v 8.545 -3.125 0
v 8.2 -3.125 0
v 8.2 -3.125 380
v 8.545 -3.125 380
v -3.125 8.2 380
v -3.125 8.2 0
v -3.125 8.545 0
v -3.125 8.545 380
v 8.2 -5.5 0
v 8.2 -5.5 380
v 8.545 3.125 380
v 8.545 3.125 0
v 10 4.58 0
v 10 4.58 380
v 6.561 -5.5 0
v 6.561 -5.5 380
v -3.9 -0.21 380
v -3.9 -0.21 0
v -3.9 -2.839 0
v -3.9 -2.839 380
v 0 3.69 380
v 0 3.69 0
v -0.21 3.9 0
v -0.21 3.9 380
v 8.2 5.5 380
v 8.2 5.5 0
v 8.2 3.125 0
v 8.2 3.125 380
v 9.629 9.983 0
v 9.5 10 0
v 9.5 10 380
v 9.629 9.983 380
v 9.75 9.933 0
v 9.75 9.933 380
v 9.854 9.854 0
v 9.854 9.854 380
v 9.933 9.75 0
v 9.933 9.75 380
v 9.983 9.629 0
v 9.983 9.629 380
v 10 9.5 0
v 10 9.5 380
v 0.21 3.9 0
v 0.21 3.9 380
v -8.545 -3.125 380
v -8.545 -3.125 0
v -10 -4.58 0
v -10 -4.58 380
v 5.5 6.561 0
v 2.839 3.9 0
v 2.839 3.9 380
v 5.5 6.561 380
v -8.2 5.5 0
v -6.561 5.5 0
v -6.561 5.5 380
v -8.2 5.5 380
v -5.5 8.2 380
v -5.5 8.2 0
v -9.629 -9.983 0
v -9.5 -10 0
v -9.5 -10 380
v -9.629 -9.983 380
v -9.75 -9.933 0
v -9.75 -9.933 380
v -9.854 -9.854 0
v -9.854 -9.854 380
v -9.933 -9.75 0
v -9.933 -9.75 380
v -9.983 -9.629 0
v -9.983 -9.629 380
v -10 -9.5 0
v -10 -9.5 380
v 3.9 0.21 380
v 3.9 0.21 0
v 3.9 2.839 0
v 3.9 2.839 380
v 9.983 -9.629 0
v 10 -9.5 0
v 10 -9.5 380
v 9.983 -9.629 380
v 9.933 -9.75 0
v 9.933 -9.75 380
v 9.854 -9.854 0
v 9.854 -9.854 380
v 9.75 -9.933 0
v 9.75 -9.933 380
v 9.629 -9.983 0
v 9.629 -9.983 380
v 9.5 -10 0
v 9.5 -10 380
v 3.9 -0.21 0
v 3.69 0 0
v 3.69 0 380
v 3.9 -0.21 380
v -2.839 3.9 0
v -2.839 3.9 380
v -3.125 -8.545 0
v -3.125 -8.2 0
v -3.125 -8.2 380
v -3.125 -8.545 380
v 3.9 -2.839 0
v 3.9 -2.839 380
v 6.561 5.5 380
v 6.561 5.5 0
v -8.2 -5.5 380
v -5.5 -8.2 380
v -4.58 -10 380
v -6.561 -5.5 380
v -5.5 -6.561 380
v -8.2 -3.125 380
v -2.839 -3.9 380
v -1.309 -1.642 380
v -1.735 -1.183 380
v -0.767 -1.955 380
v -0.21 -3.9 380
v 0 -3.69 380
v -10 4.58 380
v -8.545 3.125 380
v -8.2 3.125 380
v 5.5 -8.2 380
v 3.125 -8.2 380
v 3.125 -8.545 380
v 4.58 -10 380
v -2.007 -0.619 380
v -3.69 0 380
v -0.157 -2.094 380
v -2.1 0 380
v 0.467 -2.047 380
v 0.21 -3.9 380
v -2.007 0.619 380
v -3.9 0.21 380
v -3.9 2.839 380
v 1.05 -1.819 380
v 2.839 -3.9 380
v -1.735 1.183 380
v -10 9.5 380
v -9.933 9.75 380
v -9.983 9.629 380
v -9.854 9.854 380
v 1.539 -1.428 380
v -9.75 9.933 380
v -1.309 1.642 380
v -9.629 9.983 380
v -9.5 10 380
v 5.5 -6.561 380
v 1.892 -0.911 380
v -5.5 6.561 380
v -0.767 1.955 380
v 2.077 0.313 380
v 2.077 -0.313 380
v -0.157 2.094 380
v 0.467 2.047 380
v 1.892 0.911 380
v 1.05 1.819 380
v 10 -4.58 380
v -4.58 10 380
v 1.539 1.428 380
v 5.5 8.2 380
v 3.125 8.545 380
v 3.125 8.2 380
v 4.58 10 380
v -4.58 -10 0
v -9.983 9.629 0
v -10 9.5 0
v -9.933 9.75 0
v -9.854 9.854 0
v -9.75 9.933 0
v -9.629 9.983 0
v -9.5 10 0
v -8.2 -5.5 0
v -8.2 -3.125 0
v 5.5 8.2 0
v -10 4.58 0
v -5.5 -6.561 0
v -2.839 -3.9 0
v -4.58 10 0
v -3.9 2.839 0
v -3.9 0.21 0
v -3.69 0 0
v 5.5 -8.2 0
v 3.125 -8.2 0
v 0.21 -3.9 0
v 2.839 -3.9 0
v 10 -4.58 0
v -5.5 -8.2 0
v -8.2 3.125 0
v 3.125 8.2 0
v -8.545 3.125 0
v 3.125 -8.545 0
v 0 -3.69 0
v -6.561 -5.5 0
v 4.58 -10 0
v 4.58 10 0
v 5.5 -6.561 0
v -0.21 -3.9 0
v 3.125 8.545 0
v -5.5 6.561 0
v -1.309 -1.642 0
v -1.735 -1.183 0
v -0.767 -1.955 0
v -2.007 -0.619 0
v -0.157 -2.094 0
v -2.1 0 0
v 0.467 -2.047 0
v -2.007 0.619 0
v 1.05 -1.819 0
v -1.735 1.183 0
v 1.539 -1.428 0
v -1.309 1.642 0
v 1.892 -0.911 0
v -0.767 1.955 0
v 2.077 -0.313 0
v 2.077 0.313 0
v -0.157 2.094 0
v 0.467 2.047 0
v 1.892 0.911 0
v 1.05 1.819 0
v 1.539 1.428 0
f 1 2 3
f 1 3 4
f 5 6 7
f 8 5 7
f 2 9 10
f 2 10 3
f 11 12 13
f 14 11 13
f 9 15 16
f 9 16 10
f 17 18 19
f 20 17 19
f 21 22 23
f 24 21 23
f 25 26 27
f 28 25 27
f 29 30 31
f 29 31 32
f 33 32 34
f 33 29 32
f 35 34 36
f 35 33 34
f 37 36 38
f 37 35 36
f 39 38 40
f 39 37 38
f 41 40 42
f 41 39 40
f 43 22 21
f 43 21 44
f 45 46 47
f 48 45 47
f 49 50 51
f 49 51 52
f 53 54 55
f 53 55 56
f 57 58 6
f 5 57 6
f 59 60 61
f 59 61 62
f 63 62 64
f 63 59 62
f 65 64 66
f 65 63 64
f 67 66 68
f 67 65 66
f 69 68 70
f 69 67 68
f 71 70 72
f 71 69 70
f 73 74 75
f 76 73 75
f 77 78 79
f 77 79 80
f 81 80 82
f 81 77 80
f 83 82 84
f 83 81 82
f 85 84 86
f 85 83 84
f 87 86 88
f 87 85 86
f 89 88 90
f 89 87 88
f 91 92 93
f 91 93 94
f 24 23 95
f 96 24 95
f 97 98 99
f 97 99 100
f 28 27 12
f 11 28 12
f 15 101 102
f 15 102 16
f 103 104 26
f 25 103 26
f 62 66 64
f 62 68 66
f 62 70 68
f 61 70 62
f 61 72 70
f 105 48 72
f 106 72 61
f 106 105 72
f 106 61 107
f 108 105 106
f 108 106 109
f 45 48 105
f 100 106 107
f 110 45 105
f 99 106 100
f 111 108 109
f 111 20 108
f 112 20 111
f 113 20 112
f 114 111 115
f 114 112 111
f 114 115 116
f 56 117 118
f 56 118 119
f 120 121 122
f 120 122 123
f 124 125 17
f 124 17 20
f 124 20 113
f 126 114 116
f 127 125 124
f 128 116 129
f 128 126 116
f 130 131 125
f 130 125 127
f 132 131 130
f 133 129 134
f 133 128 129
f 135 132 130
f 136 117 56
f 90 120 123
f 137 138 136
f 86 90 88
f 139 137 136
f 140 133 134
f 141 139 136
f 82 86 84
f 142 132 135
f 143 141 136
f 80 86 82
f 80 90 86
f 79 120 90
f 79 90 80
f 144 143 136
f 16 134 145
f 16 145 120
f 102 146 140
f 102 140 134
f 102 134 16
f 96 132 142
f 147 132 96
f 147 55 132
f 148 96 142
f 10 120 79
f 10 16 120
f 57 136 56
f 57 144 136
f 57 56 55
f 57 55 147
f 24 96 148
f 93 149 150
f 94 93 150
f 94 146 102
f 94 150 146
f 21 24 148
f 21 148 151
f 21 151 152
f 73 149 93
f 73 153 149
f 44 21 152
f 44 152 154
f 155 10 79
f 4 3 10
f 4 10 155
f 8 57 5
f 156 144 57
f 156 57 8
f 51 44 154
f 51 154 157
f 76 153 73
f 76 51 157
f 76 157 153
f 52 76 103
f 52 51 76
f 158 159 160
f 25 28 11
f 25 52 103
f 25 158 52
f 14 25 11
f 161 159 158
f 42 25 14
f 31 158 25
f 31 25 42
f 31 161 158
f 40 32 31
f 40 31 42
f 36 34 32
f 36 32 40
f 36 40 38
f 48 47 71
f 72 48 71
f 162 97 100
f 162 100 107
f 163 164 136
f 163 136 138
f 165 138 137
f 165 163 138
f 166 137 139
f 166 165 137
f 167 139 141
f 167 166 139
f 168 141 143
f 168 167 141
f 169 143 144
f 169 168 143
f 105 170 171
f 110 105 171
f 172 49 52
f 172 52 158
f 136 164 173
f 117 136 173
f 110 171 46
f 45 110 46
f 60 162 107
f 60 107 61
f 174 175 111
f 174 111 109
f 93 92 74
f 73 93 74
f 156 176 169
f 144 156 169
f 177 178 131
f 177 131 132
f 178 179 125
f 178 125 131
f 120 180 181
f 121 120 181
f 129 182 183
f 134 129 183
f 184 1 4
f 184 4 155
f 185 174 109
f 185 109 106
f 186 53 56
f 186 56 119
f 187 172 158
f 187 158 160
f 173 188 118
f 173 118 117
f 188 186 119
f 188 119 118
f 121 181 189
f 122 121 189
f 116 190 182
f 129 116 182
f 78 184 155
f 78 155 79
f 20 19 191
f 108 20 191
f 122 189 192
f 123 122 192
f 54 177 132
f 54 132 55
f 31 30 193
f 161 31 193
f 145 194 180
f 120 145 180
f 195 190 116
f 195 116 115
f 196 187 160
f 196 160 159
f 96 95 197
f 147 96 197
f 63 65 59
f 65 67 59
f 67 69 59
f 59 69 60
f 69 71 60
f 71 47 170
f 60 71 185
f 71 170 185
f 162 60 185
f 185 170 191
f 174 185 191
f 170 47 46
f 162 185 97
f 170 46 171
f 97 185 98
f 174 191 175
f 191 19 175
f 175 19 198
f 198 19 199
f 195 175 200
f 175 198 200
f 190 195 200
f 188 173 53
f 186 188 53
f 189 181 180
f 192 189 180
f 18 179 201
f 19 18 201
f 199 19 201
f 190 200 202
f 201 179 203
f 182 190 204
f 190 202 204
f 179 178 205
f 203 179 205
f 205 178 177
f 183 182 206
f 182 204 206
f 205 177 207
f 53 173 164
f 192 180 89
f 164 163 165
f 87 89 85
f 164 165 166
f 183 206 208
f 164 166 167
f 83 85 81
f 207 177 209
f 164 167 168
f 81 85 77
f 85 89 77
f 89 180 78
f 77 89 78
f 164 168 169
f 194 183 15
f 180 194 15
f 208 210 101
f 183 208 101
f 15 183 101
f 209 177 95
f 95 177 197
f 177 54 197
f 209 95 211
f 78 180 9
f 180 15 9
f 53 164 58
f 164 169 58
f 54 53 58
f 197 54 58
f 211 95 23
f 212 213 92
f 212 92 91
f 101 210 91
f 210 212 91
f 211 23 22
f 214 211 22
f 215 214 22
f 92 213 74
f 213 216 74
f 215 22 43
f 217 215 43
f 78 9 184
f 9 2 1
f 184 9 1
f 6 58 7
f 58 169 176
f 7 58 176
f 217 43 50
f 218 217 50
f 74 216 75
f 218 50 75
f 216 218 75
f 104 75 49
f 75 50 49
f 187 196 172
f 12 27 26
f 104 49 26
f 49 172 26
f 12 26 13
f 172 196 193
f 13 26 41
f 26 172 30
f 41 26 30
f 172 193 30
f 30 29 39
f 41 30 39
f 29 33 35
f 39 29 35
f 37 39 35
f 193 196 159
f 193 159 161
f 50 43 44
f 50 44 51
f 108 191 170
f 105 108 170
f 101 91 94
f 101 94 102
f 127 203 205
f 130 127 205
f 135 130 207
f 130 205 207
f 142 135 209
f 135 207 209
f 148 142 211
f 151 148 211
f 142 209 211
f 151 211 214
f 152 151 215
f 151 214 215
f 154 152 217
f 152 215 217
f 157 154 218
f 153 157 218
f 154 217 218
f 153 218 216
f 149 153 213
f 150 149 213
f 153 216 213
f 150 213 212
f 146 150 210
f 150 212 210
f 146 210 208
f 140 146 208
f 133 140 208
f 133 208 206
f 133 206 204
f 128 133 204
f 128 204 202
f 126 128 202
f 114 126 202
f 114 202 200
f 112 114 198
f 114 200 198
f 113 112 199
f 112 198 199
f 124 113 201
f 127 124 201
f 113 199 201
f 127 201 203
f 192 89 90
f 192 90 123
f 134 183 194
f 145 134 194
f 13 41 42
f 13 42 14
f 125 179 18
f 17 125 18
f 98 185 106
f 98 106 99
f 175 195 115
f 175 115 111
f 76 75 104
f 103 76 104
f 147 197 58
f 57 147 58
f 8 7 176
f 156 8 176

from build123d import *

# Parameters (mm, degrees)
PAD018_DEPTH = 380


with BuildPart() as part:
    # Sketch044 → Pad018 (new body)
    with BuildSketch(Plane(origin=(0, 0, 0), x_dir=(-1, 0, 0), z_dir=(0, 0, -1))):
        with BuildLine():
            Line((-3.69, 0), (-3.9, 0.21))
            Line((-3.9, 0.21), (-3.9, 2.83934))
            Line((-3.9, 2.83934), (-6.56066, 5.5))
            Line((-6.56066, 5.5), (-8.2, 5.5))
            Line((-8.2, 5.5), (-8.2, 3.125))
            Line((-8.2, 3.125), (-8.545, 3.125))
            Line((-8.545, 3.125), (-10, 4.58))
            Line((-10, 9.5), (-10, 4.58))
            ThreePointArc((-9.5, 10), (-9.853553, 9.853553), (-10, 9.5))
            Line((-9.5, 10), (-4.58, 10))
            Line((-3.125, 8.545), (-4.58, 10))
            Line((-3.125, 8.2), (-3.125, 8.545))
            Line((-5.5, 8.2), (-3.125, 8.2))
            Line((-5.5, 6.56066), (-5.5, 8.2))
            Line((-2.83934, 3.9), (-5.5, 6.56066))
            Line((-0.21, 3.9), (-2.83934, 3.9))
            Line((0, 3.69), (-0.21, 3.9))
            Line((0, 3.69), (0.21, 3.9))
            Line((0.21, 3.9), (2.83934, 3.9))
            Line((2.83934, 3.9), (5.5, 6.56066))
            Line((5.5, 6.56066), (5.5, 8.2))
            Line((5.5, 8.2), (3.125, 8.2))
            Line((3.125, 8.2), (3.125, 8.545))
            Line((3.125, 8.545), (4.58, 10))
            Line((4.58, 10), (9.5, 10))
            ThreePointArc((10, 9.5), (9.853553, 9.853553), (9.5, 10))
            Line((10, 9.5), (10, 4.58))
            Line((8.545, 3.125), (10, 4.58))
            Line((8.2, 3.125), (8.545, 3.125))
            Line((8.2, 5.5), (8.2, 3.125))
            Line((6.56066, 5.5), (8.2, 5.5))
            Line((3.9, 2.83934), (6.56066, 5.5))
            Line((3.9, 0.21), (3.9, 2.83934))
            Line((3.69, 0), (3.9, 0.21))
            Line((3.69, 0), (3.9, -0.21))
            Line((3.9, -0.21), (3.9, -2.83934))
            Line((3.9, -2.83934), (6.56066, -5.5))
            Line((6.56066, -5.5), (8.2, -5.5))
            Line((8.2, -5.5), (8.2, -3.125))
            Line((8.2, -3.125), (8.545, -3.125))
            Line((8.545, -3.125), (10, -4.58))
            Line((10, -4.58), (10, -9.5))
            ThreePointArc((9.5, -10), (9.853553, -9.853553), (10, -9.5))
            Line((4.58, -10), (9.5, -10))
            Line((3.125, -8.545), (4.58, -10))
            Line((3.125, -8.2), (3.125, -8.545))
            Line((5.5, -8.2), (3.125, -8.2))
            Line((5.5, -6.56066), (5.5, -8.2))
            Line((2.83934, -3.9), (5.5, -6.56066))
            Line((0.21, -3.9), (2.83934, -3.9))
            Line((0, -3.69), (0.21, -3.9))
            Line((0, -3.69), (-0.21, -3.9))
            Line((-0.21, -3.9), (-2.83934, -3.9))
            Line((-2.83934, -3.9), (-5.5, -6.56066))
            Line((-5.5, -6.56066), (-5.5, -8.2))
            Line((-5.5, -8.2), (-3.125, -8.2))
            Line((-3.125, -8.2), (-3.125, -8.545))
            Line((-3.125, -8.545), (-4.58, -10))
            Line((-9.5, -10), (-4.58, -10))
            ThreePointArc((-10, -9.5), (-9.853553, -9.853553), (-9.5, -10))
            Line((-10, -4.58), (-10, -9.5))
            Line((-8.545, -3.125), (-10, -4.58))
            Line((-8.2, -3.125), (-8.545, -3.125))
            Line((-8.2, -5.5), (-8.2, -3.125))
            Line((-6.56066, -5.5), (-8.2, -5.5))
            Line((-3.9, -2.83934), (-6.56066, -5.5))
            Line((-3.9, -0.21), (-3.9, -2.83934))
            Line((-3.69, 0), (-3.9, -0.21))
        make_face()
        with BuildLine():
            ThreePointArc((-2.1, 0), (0, -2.1), (2.1, 0))
            ThreePointArc((2.1, 0), (0, 2.1), (-2.1, 0))
        make_face(mode=Mode.SUBTRACT)
    extrude(amount=-PAD018_DEPTH)


solid = part.part
